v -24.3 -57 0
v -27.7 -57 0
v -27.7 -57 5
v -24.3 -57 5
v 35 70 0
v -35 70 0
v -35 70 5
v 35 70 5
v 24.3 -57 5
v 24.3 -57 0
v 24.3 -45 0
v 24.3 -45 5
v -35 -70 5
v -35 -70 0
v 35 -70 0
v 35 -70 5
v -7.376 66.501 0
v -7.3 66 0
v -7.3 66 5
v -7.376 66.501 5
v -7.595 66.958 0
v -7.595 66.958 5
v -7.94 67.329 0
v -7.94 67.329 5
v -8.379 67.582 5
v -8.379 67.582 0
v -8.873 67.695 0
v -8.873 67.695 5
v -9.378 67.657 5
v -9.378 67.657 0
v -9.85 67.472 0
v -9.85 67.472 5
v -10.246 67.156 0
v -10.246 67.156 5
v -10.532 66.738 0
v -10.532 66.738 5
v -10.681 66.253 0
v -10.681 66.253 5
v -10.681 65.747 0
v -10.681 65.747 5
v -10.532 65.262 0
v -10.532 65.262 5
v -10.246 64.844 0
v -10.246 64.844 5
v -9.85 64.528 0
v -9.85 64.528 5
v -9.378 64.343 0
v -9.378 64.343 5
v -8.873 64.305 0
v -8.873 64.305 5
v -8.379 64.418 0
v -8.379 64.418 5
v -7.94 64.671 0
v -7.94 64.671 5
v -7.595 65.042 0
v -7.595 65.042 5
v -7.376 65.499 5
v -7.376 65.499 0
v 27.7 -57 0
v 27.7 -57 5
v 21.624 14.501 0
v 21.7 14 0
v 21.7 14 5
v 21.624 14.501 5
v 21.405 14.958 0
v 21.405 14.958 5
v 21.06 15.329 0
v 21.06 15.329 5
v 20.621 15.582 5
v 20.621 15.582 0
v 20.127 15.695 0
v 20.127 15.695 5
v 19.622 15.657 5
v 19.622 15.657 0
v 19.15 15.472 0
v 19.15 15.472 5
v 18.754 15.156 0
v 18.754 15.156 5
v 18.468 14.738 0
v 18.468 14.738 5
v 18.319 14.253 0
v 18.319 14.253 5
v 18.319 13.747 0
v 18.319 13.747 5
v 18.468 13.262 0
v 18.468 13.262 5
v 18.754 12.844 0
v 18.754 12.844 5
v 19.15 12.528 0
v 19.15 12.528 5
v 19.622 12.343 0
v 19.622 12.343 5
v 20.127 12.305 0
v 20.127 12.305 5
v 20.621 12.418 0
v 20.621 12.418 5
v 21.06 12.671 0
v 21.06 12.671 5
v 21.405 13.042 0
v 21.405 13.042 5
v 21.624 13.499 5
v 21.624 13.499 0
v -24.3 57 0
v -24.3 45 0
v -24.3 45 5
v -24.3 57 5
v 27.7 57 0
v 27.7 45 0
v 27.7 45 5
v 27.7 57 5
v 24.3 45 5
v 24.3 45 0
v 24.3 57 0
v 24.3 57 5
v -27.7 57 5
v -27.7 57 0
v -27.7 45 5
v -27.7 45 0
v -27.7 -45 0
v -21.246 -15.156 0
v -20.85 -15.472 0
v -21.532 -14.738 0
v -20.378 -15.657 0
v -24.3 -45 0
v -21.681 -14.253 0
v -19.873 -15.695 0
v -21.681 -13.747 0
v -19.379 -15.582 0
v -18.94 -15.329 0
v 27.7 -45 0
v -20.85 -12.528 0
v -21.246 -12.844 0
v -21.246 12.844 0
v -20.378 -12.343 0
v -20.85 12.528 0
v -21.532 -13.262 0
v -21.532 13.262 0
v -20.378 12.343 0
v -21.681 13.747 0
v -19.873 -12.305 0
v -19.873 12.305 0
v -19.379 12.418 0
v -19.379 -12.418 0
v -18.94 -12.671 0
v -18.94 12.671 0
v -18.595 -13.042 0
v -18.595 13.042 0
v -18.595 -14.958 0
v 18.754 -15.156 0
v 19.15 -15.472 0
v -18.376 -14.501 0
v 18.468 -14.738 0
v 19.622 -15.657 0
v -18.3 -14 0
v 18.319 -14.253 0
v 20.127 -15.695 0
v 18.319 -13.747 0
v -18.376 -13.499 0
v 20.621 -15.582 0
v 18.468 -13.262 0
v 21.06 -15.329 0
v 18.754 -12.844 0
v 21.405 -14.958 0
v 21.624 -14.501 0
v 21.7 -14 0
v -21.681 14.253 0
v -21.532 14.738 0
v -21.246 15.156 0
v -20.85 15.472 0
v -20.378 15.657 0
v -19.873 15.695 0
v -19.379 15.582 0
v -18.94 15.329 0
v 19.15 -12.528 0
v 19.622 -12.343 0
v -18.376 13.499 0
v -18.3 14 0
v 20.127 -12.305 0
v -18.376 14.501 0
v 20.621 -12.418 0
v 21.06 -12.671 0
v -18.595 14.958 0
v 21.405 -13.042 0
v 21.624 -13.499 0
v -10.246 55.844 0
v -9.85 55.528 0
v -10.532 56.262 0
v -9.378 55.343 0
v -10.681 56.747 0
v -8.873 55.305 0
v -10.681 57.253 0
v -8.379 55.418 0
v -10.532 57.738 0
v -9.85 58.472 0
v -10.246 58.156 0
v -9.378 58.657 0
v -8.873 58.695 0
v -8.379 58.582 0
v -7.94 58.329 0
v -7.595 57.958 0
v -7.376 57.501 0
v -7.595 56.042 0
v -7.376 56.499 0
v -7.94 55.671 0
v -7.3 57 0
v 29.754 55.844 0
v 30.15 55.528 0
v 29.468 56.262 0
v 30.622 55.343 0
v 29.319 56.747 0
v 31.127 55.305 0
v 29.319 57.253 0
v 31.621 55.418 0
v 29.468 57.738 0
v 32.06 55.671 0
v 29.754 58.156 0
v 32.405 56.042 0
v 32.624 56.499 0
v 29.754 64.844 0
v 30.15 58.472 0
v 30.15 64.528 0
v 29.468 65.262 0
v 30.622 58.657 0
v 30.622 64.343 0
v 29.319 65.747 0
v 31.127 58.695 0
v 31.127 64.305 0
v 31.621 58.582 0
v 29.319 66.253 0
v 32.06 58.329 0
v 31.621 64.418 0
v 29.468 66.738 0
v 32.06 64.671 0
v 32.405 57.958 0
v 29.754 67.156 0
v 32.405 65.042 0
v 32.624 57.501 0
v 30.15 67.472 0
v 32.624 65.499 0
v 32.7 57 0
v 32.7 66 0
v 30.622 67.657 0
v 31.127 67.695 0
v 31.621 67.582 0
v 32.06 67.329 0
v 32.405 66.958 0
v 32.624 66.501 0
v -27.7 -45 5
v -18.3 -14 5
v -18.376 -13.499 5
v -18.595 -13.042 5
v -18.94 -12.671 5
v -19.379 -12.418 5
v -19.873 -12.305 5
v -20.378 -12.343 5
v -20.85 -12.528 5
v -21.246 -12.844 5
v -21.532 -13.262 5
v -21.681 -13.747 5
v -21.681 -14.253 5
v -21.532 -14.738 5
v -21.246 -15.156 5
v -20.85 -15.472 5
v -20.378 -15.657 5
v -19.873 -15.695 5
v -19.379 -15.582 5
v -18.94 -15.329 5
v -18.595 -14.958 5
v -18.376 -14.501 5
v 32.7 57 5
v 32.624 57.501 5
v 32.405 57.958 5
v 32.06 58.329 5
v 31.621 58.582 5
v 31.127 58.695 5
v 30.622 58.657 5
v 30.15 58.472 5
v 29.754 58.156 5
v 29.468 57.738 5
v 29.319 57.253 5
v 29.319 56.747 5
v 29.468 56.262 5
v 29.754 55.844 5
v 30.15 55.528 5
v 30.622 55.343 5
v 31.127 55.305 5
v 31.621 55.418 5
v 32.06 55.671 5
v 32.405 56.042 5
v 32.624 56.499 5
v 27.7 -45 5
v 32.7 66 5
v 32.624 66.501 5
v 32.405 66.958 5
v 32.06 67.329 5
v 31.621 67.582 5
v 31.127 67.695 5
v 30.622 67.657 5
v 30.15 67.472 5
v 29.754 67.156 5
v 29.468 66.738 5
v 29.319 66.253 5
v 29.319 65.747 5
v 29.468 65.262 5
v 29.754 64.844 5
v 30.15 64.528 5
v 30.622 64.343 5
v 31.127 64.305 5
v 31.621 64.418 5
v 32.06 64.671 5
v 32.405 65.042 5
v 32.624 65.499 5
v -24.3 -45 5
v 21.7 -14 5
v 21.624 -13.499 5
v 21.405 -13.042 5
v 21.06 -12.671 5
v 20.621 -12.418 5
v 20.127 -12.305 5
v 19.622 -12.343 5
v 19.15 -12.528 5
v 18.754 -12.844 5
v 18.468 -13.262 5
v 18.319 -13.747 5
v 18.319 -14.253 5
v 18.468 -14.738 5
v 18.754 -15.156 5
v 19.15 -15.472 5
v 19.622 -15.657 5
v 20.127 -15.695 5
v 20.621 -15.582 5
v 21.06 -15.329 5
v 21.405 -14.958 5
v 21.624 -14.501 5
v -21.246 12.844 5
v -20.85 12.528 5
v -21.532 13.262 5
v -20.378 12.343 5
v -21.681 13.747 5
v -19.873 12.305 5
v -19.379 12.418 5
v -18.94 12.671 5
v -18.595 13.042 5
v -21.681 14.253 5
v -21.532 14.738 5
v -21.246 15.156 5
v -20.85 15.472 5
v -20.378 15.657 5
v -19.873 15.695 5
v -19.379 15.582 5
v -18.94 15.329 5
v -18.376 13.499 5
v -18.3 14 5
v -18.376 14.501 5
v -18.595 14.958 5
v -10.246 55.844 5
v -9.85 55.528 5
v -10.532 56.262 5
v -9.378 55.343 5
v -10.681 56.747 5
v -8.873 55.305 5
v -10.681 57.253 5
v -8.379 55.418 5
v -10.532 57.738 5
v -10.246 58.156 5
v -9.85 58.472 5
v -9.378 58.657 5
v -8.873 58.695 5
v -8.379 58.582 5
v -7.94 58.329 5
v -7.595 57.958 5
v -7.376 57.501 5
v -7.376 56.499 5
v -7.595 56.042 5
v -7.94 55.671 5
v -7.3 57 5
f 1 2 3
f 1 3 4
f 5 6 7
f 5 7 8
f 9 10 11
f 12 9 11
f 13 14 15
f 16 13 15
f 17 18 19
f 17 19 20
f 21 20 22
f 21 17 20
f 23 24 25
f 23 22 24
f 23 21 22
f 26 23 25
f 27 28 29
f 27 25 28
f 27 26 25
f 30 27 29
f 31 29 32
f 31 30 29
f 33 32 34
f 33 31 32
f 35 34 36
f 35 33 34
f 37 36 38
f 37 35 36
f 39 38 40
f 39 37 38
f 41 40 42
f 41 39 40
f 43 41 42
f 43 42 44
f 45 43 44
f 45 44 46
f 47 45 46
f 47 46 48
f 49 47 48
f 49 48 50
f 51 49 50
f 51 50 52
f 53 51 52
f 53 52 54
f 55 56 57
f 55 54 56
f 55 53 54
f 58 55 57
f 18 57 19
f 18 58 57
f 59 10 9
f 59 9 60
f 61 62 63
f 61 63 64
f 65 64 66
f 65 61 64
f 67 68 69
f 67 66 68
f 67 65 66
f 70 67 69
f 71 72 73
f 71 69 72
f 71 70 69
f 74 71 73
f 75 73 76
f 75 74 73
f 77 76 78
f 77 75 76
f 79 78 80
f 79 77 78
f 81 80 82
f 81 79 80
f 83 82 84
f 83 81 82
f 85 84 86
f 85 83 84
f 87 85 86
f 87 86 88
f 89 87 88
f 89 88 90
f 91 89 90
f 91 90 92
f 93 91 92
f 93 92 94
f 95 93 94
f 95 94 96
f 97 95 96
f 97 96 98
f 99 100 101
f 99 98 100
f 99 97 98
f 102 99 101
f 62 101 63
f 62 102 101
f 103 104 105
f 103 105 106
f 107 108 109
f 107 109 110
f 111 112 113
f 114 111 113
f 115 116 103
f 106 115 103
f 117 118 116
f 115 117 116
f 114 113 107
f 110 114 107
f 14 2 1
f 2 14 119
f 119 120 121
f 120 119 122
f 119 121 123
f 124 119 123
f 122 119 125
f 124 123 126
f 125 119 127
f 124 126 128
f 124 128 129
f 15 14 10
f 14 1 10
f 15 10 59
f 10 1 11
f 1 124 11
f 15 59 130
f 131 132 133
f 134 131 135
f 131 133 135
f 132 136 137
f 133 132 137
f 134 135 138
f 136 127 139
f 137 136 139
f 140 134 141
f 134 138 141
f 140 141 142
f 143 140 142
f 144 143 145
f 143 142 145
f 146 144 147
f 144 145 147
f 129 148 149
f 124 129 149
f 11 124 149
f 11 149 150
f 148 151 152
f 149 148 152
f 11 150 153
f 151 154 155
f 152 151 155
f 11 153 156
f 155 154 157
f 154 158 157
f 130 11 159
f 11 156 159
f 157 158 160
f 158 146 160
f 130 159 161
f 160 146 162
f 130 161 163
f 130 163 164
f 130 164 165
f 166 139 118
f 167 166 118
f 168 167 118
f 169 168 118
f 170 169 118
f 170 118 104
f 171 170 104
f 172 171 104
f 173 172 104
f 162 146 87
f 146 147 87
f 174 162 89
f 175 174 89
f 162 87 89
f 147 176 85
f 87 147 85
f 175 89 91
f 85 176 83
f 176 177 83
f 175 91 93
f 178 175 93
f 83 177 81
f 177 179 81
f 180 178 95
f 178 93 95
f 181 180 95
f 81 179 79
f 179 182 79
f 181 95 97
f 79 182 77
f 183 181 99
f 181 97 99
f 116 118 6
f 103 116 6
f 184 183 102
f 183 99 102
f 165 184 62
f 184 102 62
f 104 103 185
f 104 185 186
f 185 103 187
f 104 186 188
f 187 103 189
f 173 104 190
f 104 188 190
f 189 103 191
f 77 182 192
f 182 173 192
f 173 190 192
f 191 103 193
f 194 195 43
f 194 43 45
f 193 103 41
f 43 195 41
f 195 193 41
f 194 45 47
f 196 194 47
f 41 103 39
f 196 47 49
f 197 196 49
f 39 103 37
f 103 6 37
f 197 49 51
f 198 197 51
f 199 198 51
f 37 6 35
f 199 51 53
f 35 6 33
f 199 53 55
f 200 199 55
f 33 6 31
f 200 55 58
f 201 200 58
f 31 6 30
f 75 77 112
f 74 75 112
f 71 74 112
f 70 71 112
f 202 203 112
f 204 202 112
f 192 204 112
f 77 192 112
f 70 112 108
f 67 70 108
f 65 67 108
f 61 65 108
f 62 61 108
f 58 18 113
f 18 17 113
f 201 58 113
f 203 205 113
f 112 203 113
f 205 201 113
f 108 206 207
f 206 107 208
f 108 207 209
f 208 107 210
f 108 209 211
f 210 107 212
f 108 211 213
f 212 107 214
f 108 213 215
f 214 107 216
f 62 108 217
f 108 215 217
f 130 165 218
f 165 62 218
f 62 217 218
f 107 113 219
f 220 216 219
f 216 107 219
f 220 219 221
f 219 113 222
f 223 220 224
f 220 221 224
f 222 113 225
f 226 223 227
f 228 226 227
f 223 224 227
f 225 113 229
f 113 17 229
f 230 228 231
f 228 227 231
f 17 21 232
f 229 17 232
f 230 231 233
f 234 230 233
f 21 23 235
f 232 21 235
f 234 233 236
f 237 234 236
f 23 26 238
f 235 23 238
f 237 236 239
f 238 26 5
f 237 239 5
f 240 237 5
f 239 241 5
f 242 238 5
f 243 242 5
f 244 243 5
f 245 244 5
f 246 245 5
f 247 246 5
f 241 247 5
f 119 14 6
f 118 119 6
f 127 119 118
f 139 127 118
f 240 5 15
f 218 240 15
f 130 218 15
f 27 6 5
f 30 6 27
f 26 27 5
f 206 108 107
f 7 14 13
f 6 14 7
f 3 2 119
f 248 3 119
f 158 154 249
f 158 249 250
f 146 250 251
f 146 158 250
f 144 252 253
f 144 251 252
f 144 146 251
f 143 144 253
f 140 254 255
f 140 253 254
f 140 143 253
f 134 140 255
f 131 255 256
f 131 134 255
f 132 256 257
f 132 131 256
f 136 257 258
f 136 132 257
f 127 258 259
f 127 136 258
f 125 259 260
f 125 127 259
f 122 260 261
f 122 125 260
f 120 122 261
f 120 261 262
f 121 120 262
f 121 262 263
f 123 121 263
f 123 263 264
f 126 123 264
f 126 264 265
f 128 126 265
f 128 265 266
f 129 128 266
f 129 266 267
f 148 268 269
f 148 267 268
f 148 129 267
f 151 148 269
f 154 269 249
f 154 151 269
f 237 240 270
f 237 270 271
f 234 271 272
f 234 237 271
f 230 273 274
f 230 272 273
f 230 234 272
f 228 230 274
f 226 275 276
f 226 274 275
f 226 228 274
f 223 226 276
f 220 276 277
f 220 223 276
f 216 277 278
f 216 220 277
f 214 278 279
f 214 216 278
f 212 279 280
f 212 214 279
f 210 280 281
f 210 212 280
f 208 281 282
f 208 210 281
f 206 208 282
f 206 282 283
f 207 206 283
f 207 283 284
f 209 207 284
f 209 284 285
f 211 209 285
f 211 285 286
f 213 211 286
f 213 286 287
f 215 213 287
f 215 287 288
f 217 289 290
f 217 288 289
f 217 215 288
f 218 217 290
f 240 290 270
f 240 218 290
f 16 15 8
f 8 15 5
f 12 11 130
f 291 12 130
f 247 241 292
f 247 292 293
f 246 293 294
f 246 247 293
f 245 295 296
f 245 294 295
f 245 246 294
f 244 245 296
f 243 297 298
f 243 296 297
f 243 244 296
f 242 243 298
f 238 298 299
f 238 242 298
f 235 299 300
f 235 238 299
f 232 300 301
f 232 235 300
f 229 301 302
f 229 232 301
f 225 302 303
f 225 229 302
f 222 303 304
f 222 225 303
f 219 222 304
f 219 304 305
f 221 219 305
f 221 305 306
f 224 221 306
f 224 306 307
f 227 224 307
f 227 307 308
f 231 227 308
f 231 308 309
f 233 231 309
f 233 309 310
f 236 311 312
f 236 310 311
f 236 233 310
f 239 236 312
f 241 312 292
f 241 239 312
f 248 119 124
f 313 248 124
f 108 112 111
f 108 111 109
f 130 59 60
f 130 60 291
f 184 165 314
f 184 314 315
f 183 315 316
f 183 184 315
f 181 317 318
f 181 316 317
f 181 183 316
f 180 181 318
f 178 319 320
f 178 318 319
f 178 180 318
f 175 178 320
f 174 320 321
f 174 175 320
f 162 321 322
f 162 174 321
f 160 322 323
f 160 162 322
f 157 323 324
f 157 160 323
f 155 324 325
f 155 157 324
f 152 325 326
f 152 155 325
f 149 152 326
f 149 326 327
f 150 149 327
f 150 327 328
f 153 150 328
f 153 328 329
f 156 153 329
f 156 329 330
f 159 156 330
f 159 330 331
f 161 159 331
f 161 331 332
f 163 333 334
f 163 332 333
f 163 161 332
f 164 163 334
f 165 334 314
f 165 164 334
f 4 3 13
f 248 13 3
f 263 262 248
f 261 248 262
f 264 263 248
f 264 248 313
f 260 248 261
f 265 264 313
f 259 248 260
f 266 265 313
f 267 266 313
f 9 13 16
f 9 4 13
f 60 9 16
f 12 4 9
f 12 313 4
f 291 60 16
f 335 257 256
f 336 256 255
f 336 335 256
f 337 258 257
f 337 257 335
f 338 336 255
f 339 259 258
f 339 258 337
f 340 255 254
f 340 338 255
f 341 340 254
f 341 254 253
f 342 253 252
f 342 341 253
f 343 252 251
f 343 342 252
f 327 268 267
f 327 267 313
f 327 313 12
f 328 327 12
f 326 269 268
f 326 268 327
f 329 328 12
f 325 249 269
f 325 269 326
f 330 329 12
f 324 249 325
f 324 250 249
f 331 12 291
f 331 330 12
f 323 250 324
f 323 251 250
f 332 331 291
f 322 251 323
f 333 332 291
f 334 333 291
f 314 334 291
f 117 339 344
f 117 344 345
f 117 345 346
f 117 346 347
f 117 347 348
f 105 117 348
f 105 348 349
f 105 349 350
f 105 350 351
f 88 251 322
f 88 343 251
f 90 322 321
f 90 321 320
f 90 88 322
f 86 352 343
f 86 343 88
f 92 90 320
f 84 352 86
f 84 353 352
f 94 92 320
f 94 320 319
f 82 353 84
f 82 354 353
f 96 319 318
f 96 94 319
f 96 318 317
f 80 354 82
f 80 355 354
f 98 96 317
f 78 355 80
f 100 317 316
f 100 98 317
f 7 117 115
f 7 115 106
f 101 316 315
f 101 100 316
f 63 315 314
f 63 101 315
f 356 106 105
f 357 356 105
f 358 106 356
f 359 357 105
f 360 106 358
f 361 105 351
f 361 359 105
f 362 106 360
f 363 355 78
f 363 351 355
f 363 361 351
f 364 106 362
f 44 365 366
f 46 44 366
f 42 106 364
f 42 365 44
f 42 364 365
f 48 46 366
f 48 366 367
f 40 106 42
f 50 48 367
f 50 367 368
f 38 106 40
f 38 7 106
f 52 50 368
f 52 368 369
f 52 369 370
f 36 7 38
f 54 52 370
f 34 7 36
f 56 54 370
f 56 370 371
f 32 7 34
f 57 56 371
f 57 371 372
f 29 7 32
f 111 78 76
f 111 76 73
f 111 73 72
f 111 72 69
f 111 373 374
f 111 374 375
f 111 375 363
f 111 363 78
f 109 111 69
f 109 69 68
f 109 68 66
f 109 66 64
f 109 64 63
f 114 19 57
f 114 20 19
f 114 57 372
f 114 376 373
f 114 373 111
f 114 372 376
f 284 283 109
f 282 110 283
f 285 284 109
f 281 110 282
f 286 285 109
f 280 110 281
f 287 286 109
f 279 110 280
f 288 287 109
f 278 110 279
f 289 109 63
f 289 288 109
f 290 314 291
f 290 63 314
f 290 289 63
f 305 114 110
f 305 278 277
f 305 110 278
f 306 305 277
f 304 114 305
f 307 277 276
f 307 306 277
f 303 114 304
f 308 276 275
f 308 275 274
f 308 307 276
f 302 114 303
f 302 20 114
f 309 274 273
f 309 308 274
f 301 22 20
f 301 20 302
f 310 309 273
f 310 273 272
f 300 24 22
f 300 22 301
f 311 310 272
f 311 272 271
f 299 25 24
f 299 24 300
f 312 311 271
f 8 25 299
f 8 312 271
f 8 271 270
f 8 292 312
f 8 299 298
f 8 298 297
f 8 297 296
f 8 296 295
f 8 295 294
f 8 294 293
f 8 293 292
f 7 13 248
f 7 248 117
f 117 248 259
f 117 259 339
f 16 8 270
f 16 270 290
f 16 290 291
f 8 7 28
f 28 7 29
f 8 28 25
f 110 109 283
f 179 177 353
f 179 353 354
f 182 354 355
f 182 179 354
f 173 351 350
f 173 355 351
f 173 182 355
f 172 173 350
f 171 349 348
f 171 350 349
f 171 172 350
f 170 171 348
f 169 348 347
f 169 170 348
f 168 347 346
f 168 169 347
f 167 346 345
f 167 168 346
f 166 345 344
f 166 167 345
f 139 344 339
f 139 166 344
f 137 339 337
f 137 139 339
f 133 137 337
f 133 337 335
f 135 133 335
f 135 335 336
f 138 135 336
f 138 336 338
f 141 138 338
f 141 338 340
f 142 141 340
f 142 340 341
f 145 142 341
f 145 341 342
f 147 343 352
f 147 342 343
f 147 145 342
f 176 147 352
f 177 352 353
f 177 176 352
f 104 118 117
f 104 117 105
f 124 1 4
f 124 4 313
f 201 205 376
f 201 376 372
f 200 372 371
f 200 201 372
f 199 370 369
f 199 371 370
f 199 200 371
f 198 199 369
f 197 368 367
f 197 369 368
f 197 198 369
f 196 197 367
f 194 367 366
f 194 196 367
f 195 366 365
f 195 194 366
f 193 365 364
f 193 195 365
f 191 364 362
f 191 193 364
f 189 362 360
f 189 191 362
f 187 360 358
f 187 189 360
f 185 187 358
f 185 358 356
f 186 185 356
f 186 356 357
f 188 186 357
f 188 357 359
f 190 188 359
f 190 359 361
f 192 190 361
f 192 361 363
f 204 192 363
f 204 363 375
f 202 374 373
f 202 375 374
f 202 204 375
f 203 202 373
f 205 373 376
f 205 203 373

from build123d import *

# Parameters (mm, degrees)
SKETCH_1_W                                          = 70
SKETCH_1_H                                          = 140
BASE_70X140X5_DEPTH                                 = 5
CHASSIS_ADJUSTMENT_SLOTS_UNVERIFIED_POSI_DEPTH      = 79.421935707
CHASSIS_ADJUSTMENT_SLOTS_UNVERIFIED_POSI_DEPTH_BACK = 79.421935707
SKETCH_2_W                                          = 3.4
SKETCH_2_H                                          = 12
SUPPORT_AND_SERVO_MOUNT_M3_CLEARANCE_DEPTH          = 79.421935707
SUPPORT_AND_SERVO_MOUNT_M3_CLEARANCE_DEPTH_BACK     = 79.421935707
SKETCH_3_R                                          = 1.7


with BuildPart() as part:
    # 草图1 → Base_70x140x5 (new body)
    with BuildSketch(Plane.XY):
        Rectangle(SKETCH_1_W, SKETCH_1_H)
    extrude(amount=BASE_70X140X5_DEPTH)

    # 草图2 → Chassis_adjustment_slots_UNVERIFIED_positions (cut, two sides: drawn at the far end of the back side and taken through both)
    with BuildSketch(Plane.XY.offset(-CHASSIS_ADJUSTMENT_SLOTS_UNVERIFIED_POSI_DEPTH_BACK)):
        with Locations((-26, -51)):
            Rectangle(SKETCH_2_W, SKETCH_2_H)
        with Locations((-26, 51)):
            Rectangle(SKETCH_2_W, SKETCH_2_H)
        with Locations((26, -51)):
            Rectangle(SKETCH_2_W, SKETCH_2_H)
        with Locations((26, 51)):
            Rectangle(SKETCH_2_W, SKETCH_2_H)
    extrude(amount=CHASSIS_ADJUSTMENT_SLOTS_UNVERIFIED_POSI_DEPTH + CHASSIS_ADJUSTMENT_SLOTS_UNVERIFIED_POSI_DEPTH_BACK, mode=Mode.SUBTRACT)

    # 草图3 → Support_and_servo_mount_M3_clearance (cut, two sides: drawn at the far end of the back side and taken through both)
    with BuildSketch(Plane.XY.offset(-SUPPORT_AND_SERVO_MOUNT_M3_CLEARANCE_DEPTH_BACK)):
        with Locations((-20, -14)):
            Circle(SKETCH_3_R)
        with Locations((-20, 14)):
            Circle(SKETCH_3_R)
        with Locations((20, -14)):
            Circle(SKETCH_3_R)
        with Locations((20, 14)):
            Circle(SKETCH_3_R)
        with Locations((-9, 57)):
            Circle(SKETCH_3_R)
        with Locations((-9, 66)):
            Circle(SKETCH_3_R)
        with Locations((31, 57)):
            Circle(SKETCH_3_R)
        with Locations((31, 66)):
            Circle(SKETCH_3_R)
    extrude(amount=SUPPORT_AND_SERVO_MOUNT_M3_CLEARANCE_DEPTH + SUPPORT_AND_SERVO_MOUNT_M3_CLEARANCE_DEPTH_BACK, mode=Mode.SUBTRACT)


solid = part.part
